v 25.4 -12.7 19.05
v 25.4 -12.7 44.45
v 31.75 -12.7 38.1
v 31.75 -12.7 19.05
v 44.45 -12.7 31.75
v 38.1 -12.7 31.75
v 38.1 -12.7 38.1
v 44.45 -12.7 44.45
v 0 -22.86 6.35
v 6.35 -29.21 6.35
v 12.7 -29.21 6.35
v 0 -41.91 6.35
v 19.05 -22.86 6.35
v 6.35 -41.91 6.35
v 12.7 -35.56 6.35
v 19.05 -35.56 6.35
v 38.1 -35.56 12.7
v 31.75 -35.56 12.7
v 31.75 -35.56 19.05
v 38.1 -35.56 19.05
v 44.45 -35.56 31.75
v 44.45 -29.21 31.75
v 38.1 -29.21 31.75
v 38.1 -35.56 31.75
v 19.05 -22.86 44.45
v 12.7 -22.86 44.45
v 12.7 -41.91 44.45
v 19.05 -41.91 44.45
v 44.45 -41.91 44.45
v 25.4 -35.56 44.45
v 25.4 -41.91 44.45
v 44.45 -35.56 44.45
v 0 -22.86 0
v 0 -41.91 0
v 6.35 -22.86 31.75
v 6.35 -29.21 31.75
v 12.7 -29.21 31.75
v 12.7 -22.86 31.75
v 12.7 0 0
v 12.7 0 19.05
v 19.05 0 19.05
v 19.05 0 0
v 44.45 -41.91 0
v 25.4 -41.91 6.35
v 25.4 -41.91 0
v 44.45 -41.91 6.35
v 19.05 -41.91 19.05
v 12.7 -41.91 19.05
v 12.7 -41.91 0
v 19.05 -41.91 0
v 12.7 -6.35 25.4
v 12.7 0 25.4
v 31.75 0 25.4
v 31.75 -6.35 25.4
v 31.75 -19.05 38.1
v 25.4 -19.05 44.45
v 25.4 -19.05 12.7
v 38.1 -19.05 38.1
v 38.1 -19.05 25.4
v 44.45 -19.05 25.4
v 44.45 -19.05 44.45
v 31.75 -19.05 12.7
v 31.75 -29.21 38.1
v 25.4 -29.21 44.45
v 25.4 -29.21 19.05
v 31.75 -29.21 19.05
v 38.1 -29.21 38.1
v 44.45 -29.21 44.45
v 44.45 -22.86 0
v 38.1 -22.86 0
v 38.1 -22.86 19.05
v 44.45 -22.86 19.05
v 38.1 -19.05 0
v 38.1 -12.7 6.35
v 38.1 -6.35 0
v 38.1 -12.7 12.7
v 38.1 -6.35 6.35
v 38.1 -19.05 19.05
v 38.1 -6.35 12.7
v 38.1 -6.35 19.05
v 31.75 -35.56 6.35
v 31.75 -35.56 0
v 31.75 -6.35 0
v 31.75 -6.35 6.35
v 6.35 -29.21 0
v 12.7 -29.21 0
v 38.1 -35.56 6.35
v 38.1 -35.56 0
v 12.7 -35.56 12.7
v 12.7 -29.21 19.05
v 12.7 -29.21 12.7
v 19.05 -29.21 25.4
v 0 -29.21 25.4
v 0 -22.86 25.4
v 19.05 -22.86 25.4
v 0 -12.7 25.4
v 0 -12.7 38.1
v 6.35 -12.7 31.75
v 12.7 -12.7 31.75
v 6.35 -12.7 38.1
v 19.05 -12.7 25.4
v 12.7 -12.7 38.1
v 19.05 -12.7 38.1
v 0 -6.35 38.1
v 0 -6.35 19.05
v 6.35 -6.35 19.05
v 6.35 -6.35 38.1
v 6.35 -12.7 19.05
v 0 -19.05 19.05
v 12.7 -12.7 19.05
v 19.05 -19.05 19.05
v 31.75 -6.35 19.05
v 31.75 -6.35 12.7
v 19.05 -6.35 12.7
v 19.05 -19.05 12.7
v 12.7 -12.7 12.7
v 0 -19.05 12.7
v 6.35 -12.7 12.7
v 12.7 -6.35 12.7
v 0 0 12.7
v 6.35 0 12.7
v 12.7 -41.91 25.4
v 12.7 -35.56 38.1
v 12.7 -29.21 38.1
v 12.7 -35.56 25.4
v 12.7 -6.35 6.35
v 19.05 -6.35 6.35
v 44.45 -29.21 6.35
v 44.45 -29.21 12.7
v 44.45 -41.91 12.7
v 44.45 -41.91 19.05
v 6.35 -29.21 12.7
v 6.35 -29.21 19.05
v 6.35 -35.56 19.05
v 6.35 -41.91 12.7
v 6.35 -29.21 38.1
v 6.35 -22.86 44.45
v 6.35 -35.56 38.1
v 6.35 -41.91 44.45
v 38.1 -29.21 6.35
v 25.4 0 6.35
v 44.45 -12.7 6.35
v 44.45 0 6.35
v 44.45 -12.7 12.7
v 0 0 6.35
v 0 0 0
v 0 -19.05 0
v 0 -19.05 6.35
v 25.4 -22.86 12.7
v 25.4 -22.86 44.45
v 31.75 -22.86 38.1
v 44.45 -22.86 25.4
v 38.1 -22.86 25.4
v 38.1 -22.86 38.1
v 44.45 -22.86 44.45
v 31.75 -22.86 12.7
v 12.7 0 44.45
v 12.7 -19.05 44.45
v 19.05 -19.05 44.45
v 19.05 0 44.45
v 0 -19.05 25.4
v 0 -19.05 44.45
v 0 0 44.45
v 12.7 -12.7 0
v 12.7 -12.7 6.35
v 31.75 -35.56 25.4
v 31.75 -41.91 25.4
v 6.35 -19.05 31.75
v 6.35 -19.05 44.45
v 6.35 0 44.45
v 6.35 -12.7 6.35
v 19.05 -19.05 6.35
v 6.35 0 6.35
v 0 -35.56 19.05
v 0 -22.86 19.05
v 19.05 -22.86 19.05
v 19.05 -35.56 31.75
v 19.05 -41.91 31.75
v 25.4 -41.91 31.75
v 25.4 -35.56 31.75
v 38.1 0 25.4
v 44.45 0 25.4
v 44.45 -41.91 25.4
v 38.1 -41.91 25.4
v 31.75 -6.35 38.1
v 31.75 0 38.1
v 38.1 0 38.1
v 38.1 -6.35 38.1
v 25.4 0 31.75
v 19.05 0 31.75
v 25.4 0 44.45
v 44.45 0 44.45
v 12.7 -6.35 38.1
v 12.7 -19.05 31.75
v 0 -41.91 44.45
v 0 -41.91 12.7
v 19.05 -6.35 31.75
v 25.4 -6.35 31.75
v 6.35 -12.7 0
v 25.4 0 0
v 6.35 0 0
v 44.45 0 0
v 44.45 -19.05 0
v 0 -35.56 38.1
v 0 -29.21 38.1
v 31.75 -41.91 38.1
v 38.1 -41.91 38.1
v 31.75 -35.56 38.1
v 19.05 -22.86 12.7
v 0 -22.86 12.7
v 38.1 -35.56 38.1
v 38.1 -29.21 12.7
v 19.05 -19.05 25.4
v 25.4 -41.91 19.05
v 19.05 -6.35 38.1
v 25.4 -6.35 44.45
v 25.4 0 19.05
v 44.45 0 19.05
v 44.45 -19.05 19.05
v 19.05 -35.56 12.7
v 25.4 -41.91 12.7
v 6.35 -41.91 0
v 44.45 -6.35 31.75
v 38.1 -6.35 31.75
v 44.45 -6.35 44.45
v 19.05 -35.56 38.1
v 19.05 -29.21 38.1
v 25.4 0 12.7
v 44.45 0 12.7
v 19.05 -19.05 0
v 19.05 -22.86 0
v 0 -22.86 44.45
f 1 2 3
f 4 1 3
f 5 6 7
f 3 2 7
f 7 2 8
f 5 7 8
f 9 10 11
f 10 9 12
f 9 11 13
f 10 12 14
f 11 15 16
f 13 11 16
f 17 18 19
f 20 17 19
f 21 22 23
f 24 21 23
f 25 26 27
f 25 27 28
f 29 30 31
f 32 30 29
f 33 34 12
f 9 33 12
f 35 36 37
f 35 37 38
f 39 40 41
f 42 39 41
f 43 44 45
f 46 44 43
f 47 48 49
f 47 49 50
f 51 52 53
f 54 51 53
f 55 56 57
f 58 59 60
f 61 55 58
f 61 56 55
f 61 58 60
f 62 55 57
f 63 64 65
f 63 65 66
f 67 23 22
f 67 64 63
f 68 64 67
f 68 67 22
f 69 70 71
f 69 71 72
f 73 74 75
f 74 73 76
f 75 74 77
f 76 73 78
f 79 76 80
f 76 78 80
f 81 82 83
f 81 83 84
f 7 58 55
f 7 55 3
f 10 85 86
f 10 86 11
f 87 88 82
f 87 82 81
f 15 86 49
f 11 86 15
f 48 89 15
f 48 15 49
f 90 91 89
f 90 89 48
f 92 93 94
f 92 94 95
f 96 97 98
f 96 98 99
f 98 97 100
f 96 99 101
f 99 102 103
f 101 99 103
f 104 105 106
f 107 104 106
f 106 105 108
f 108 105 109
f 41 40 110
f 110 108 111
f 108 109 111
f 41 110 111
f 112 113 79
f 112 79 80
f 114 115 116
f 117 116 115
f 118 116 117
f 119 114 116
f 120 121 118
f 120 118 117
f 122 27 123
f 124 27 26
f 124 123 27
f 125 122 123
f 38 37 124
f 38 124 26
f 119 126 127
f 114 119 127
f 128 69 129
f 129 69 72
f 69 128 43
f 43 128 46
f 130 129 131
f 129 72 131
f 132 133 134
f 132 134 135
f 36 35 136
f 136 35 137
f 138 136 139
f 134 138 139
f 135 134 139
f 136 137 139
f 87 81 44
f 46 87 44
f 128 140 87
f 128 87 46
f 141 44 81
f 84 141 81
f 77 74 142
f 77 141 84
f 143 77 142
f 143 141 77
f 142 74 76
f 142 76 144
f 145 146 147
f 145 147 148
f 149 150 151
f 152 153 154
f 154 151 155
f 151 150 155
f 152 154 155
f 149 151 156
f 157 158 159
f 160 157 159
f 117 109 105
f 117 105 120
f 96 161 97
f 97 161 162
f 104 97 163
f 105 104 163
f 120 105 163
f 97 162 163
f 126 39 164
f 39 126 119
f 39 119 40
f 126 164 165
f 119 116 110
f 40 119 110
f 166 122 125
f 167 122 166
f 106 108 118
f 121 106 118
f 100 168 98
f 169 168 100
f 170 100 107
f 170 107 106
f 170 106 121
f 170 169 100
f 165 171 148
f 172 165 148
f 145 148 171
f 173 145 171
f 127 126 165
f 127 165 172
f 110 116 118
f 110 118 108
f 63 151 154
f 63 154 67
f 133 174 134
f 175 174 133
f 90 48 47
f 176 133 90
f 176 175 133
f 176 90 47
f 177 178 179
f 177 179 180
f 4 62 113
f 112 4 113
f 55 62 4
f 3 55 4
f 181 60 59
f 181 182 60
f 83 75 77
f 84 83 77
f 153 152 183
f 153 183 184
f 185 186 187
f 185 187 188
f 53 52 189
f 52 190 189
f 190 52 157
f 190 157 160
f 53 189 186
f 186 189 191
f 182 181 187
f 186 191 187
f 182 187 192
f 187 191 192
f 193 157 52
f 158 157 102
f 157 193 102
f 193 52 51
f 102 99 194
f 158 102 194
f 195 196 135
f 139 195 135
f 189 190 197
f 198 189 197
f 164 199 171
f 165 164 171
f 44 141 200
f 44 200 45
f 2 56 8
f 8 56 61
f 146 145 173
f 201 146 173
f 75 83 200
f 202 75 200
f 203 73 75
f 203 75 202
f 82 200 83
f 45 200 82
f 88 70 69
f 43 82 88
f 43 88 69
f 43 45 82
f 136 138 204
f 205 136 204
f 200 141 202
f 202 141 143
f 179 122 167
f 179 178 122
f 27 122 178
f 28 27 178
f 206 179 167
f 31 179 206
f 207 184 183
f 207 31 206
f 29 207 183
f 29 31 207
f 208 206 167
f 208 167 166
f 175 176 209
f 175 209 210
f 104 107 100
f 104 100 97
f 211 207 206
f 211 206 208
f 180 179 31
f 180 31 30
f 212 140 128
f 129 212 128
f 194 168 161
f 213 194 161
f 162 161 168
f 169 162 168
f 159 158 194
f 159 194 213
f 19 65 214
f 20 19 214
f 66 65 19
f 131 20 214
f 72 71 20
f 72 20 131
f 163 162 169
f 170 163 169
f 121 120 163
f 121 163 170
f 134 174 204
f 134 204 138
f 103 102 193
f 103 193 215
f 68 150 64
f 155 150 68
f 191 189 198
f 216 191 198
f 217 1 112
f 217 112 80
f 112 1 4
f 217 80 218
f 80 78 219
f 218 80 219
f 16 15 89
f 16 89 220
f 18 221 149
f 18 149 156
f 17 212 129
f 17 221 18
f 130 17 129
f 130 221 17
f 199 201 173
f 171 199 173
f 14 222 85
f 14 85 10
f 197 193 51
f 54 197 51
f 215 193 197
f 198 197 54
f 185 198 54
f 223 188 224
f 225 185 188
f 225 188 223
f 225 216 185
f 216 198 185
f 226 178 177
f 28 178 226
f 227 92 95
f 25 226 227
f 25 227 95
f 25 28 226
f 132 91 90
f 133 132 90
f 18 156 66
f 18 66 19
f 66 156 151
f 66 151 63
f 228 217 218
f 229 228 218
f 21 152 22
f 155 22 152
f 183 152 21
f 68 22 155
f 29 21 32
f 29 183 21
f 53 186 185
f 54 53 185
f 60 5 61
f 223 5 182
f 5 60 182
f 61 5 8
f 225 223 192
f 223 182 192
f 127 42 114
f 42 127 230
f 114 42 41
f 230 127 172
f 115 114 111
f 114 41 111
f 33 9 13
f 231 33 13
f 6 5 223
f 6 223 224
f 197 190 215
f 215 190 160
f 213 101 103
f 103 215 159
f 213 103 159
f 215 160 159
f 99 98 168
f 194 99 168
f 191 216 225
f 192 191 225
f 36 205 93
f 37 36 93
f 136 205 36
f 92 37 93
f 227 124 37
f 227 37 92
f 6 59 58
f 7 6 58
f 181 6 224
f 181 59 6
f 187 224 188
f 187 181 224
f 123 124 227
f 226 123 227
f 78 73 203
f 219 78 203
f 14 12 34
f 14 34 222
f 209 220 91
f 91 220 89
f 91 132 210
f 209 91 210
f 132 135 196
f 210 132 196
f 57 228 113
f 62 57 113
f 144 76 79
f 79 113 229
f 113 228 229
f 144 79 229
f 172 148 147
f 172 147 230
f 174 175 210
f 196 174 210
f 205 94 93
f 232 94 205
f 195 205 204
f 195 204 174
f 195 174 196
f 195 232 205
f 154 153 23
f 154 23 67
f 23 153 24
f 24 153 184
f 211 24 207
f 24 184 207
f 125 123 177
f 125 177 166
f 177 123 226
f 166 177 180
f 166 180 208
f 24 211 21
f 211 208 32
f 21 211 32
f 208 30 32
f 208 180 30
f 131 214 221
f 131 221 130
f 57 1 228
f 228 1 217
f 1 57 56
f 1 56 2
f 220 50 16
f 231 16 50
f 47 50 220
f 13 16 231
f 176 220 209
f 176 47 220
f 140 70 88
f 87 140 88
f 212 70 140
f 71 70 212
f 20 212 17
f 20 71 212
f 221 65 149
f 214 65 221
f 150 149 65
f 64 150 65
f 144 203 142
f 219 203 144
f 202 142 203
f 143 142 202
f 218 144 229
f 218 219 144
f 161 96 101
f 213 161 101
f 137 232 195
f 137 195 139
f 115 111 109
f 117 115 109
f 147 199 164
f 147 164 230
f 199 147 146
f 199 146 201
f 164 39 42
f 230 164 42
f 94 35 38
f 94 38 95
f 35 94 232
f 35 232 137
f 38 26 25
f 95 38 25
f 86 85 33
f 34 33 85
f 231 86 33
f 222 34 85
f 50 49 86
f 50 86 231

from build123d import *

# Parameters (mm, degrees)
F0_W      = 6.35
F0_H      = 6.35
F1_DEPTH  = 19.05
F2_W      = 6.35
F2_H      = 6.35
F3_DEPTH  = 19.05
F4_W      = 6.35
F4_H      = 6.35
F5_DEPTH  = 19.05
F6_W      = 6.35
F6_H      = 6.35
F7_DEPTH  = 19.05
F8_W      = 6.35
F8_H      = 6.35
F9_DEPTH  = 19.05
F10_W     = 6.35
F10_H     = 6.35
F11_DEPTH = 19.05
F12_W     = 6.35
F12_H     = 6.35
F13_DEPTH = 19.05
F14_W     = 6.35
F14_H     = 6.35
F15_DEPTH = 31.75
F16_W     = 6.35
F16_H     = 6.35
F17_DEPTH = 19.05
F18_W     = 6.35
F18_H     = 6.35
F19_DEPTH = 19.05
F20_W     = 6.35
F20_H     = 6.35
F21_DEPTH = 19.05
F22_W     = 6.35
F22_H     = 6.35
F23_DEPTH = 19.05
F24_W     = 6.35
F24_H     = 6.35
F25_DEPTH = 19.05
F26_W     = 6.35
F26_H     = 6.35
F27_DEPTH = 19.05
F28_W     = 6.35
F28_H     = 6.35
F29_DEPTH = 19.05
F30_W     = 6.35
F30_H     = 6.35
F31_DEPTH = 19.05
F32_W     = 6.35
F32_H     = 6.35
F33_DEPTH = 19.05
F34_W     = 6.35
F34_H     = 6.35
F35_DEPTH = 19.05
F36_W     = 6.35
F36_H     = 6.35
F37_DEPTH = 19.05
F38_W     = 6.35
F38_H     = 6.35
F39_DEPTH = 19.05
F40_W     = 6.35
F40_H     = 6.35
F41_DEPTH = 19.05
F42_W     = 6.35
F42_H     = 6.35
F43_DEPTH = 31.75
F44_W     = 6.35
F44_H     = 6.35
F45_DEPTH = 19.05
F46_W     = 6.35
F46_H     = 6.35
F47_DEPTH = 19.05
F48_W     = 6.35
F48_H     = 6.35
F49_DEPTH = 19.05
F50_W     = 6.35
F50_H     = 6.35
F51_DEPTH = 19.05
F52_W     = 6.35
F52_H     = 6.35
F53_DEPTH = 19.05
F54_W     = 6.35
F54_H     = 6.35
F55_DEPTH = 19.05
F56_W     = 6.35
F56_H     = 6.35
F57_DEPTH = 20.955


with BuildPart() as f1:
    # F0 (on Front) → F1 (new body)
    with BuildSketch(Plane.XZ):
        with Locations((3.175, 3.175)):
            Rectangle(F0_W, F0_H)
    extrude(amount=F1_DEPTH)

    # F2 (on face) → F3 (join)
    with BuildSketch(Plane(origin=(0, 0, 0), x_dir=(0, -1, 0), z_dir=(-1, 0, 0))):
        with Locations((15.875, 3.175)):
            Rectangle(F2_W, F2_H)
    extrude(amount=-F3_DEPTH)

    # F4 (on face) → F5 (join)
    with BuildSketch(Plane.XZ.offset(19.05)):
        with Locations((15.875, 3.175)):
            Rectangle(F4_W, F4_H)
    extrude(amount=-F5_DEPTH)

    # F6 (on face) → F7 (join)
    with BuildSketch(Plane(origin=(0, 0, 0), x_dir=(1, 0, 0), z_dir=(0, 0, -1))):
        with Locations((15.875, 3.175)):
            Rectangle(F6_W, F6_H)
    extrude(amount=-F7_DEPTH)

    # F8 (on face) → F9 (join)
    with BuildSketch(Plane(origin=(0, 0, 0), x_dir=(-1, 0, 0), z_dir=(0, 1, 0))):
        with Locations((-15.875, 15.875)):
            Rectangle(F8_W, F8_H)
    extrude(amount=-F9_DEPTH)

    # F10 (on face) → F11 (join)
    with BuildSketch(Plane.YZ.offset(19.05)):
        with Locations((-15.875, 15.875)):
            Rectangle(F10_W, F10_H)
    extrude(amount=-F11_DEPTH)

    # F12 (on face) → F13 (join)
    with BuildSketch(Plane.XZ.offset(19.05)):
        with Locations((3.175, 15.875)):
            Rectangle(F12_W, F12_H)
    extrude(amount=-F13_DEPTH)

    # F14 (on face) → F15 (join)
    with BuildSketch(Plane(origin=(0, 0, 12.7), x_dir=(1, 0, 0), z_dir=(0, 0, -1))):
        with Locations((3.175, 3.175)):
            Rectangle(F14_W, F14_H)
    extrude(amount=-F15_DEPTH)

    # F16 (on face) → F17 (join)
    with BuildSketch(Plane(origin=(0, 0, 0), x_dir=(-1, 0, 0), z_dir=(0, 1, 0))):
        with Locations((-3.175, 41.275)):
            Rectangle(F16_W, F16_H)
    extrude(amount=-F17_DEPTH)

    # F18 (on face) → F19 (join)
    with BuildSketch(Plane.XY.offset(44.45)):
        with Locations((3.175, -15.875)):
            Rectangle(F18_W, F18_H)
    extrude(amount=-F19_DEPTH)

    # F20 (on face) → F21 (join)
    with BuildSketch(Plane(origin=(0, 0, 0), x_dir=(0, -1, 0), z_dir=(-1, 0, 0))):
        with Locations((15.875, 28.575)):
            Rectangle(F20_W, F20_H)
    extrude(amount=-F21_DEPTH)

    # F22 (on face) → F23 (join)
    with BuildSketch(Plane(origin=(0, 0, 25.4), x_dir=(1, 0, 0), z_dir=(0, 0, -1))):
        with Locations((15.875, 15.875)):
            Rectangle(F22_W, F22_H)
    extrude(amount=-F23_DEPTH)

    # F24 (on face) → F25 (join)
    with BuildSketch(Plane.XZ.offset(19.05)):
        with Locations((15.875, 41.275)):
            Rectangle(F24_W, F24_H)
    extrude(amount=-F25_DEPTH)

    # F26 (on face) → F27 (join)
    with BuildSketch(Plane.XY.offset(44.45)):
        with Locations((15.875, -3.175)):
            Rectangle(F26_W, F26_H)
    extrude(amount=-F27_DEPTH)

    # F28 (on face) → F29 (join)
    with BuildSketch(Plane(origin=(12.7, 0, 0), x_dir=(0, -1, 0), z_dir=(-1, 0, 0))):
        with Locations((3.175, 28.575)):
            Rectangle(F28_W, F28_H)
    extrude(amount=-F29_DEPTH)

    # F30 (on face) → F31 (join)
    with BuildSketch(Plane(origin=(0, 0, 25.4), x_dir=(1, 0, 0), z_dir=(0, 0, -1))):
        with Locations((28.575, 3.175)):
            Rectangle(F30_W, F30_H)
    extrude(amount=-F31_DEPTH)

    # F32 (on face) → F33 (join)
    with BuildSketch(Plane(origin=(25.4, 0, 0), x_dir=(0, -1, 0), z_dir=(-1, 0, 0))):
        with Locations((3.175, 41.275)):
            Rectangle(F32_W, F32_H)
    extrude(amount=-F33_DEPTH)

    # F34 (on face) → F35 (join)
    with BuildSketch(Plane.XY.offset(44.45)):
        with Locations((41.275, -3.175)):
            Rectangle(F34_W, F34_H)
    extrude(amount=-F35_DEPTH)

    # F36 (on face) → F37 (join)
    with BuildSketch(Plane(origin=(0, 0, 0), x_dir=(-1, 0, 0), z_dir=(0, 1, 0))):
        with Locations((-41.275, 28.575)):
            Rectangle(F36_W, F36_H)
    extrude(amount=-F37_DEPTH)

    # F38 (on face) → F39 (join)
    with BuildSketch(Plane(origin=(0, 0, 25.4), x_dir=(1, 0, 0), z_dir=(0, 0, -1))):
        with Locations((41.275, 15.875)):
            Rectangle(F38_W, F38_H)
    extrude(amount=-F39_DEPTH)

    # F40 (on face) → F41 (join)
    with BuildSketch(Plane.YZ.offset(44.45)):
        with Locations((-15.875, 41.275)):
            Rectangle(F40_W, F40_H)
    extrude(amount=-F41_DEPTH)

    # F42 (on face) → F43 (join)
    with BuildSketch(Plane.XY.offset(44.45)):
        with Locations((28.575, -15.875)):
            Rectangle(F42_W, F42_H)
    extrude(amount=-F43_DEPTH)

    # F44 (on face) → F45 (join)
    with BuildSketch(Plane.XZ.offset(19.05)):
        with Locations((28.575, 15.875)):
            Rectangle(F44_W, F44_H)
    extrude(amount=-F45_DEPTH)

    # F46 (on face) → F47 (join)
    with BuildSketch(Plane(origin=(25.4, 0, 0), x_dir=(0, -1, 0), z_dir=(-1, 0, 0))):
        with Locations((3.175, 15.875)):
            Rectangle(F46_W, F46_H)
    extrude(amount=-F47_DEPTH)

    # F48 (on face) → F49 (join)
    with BuildSketch(Plane(origin=(0, 0, 0), x_dir=(-1, 0, 0), z_dir=(0, 1, 0))):
        with Locations((-41.275, 15.875)):
            Rectangle(F48_W, F48_H)
    extrude(amount=-F49_DEPTH)

    # F50 (on face) → F51 (join)
    with BuildSketch(Plane.XY.offset(19.05)):
        with Locations((41.275, -15.875)):
            Rectangle(F50_W, F50_H)
    extrude(amount=-F51_DEPTH)

    # F52 (on face) → F53 (join)
    with BuildSketch(Plane.XZ.offset(19.05)):
        with Locations((41.275, 3.175)):
            Rectangle(F52_W, F52_H)
    extrude(amount=-F53_DEPTH)

    # F54 (on face) → F55 (join)
    with BuildSketch(Plane.YZ.offset(44.45)):
        with Locations((-3.175, 3.175)):
            Rectangle(F54_W, F54_H)
    extrude(amount=-F55_DEPTH)

    # F56 (on face) → F57 (join)
    with BuildSketch(Plane(origin=(0, 0, 0), x_dir=(-1, 0, 0), z_dir=(0, 1, 0))):
        with Locations((-28.575, 3.175)):
            Rectangle(F56_W, F56_H)
    extrude(amount=-F57_DEPTH)

    # F58: F1 across face


with BuildPart() as f1_1:
    add(f1.part)
    add(f1.part.mirror(Plane(origin=(28.575, -20.955, 3.175), x_dir=(-1, 0, 0), z_dir=(0, -1, 0))))


solid = f1_1.part
